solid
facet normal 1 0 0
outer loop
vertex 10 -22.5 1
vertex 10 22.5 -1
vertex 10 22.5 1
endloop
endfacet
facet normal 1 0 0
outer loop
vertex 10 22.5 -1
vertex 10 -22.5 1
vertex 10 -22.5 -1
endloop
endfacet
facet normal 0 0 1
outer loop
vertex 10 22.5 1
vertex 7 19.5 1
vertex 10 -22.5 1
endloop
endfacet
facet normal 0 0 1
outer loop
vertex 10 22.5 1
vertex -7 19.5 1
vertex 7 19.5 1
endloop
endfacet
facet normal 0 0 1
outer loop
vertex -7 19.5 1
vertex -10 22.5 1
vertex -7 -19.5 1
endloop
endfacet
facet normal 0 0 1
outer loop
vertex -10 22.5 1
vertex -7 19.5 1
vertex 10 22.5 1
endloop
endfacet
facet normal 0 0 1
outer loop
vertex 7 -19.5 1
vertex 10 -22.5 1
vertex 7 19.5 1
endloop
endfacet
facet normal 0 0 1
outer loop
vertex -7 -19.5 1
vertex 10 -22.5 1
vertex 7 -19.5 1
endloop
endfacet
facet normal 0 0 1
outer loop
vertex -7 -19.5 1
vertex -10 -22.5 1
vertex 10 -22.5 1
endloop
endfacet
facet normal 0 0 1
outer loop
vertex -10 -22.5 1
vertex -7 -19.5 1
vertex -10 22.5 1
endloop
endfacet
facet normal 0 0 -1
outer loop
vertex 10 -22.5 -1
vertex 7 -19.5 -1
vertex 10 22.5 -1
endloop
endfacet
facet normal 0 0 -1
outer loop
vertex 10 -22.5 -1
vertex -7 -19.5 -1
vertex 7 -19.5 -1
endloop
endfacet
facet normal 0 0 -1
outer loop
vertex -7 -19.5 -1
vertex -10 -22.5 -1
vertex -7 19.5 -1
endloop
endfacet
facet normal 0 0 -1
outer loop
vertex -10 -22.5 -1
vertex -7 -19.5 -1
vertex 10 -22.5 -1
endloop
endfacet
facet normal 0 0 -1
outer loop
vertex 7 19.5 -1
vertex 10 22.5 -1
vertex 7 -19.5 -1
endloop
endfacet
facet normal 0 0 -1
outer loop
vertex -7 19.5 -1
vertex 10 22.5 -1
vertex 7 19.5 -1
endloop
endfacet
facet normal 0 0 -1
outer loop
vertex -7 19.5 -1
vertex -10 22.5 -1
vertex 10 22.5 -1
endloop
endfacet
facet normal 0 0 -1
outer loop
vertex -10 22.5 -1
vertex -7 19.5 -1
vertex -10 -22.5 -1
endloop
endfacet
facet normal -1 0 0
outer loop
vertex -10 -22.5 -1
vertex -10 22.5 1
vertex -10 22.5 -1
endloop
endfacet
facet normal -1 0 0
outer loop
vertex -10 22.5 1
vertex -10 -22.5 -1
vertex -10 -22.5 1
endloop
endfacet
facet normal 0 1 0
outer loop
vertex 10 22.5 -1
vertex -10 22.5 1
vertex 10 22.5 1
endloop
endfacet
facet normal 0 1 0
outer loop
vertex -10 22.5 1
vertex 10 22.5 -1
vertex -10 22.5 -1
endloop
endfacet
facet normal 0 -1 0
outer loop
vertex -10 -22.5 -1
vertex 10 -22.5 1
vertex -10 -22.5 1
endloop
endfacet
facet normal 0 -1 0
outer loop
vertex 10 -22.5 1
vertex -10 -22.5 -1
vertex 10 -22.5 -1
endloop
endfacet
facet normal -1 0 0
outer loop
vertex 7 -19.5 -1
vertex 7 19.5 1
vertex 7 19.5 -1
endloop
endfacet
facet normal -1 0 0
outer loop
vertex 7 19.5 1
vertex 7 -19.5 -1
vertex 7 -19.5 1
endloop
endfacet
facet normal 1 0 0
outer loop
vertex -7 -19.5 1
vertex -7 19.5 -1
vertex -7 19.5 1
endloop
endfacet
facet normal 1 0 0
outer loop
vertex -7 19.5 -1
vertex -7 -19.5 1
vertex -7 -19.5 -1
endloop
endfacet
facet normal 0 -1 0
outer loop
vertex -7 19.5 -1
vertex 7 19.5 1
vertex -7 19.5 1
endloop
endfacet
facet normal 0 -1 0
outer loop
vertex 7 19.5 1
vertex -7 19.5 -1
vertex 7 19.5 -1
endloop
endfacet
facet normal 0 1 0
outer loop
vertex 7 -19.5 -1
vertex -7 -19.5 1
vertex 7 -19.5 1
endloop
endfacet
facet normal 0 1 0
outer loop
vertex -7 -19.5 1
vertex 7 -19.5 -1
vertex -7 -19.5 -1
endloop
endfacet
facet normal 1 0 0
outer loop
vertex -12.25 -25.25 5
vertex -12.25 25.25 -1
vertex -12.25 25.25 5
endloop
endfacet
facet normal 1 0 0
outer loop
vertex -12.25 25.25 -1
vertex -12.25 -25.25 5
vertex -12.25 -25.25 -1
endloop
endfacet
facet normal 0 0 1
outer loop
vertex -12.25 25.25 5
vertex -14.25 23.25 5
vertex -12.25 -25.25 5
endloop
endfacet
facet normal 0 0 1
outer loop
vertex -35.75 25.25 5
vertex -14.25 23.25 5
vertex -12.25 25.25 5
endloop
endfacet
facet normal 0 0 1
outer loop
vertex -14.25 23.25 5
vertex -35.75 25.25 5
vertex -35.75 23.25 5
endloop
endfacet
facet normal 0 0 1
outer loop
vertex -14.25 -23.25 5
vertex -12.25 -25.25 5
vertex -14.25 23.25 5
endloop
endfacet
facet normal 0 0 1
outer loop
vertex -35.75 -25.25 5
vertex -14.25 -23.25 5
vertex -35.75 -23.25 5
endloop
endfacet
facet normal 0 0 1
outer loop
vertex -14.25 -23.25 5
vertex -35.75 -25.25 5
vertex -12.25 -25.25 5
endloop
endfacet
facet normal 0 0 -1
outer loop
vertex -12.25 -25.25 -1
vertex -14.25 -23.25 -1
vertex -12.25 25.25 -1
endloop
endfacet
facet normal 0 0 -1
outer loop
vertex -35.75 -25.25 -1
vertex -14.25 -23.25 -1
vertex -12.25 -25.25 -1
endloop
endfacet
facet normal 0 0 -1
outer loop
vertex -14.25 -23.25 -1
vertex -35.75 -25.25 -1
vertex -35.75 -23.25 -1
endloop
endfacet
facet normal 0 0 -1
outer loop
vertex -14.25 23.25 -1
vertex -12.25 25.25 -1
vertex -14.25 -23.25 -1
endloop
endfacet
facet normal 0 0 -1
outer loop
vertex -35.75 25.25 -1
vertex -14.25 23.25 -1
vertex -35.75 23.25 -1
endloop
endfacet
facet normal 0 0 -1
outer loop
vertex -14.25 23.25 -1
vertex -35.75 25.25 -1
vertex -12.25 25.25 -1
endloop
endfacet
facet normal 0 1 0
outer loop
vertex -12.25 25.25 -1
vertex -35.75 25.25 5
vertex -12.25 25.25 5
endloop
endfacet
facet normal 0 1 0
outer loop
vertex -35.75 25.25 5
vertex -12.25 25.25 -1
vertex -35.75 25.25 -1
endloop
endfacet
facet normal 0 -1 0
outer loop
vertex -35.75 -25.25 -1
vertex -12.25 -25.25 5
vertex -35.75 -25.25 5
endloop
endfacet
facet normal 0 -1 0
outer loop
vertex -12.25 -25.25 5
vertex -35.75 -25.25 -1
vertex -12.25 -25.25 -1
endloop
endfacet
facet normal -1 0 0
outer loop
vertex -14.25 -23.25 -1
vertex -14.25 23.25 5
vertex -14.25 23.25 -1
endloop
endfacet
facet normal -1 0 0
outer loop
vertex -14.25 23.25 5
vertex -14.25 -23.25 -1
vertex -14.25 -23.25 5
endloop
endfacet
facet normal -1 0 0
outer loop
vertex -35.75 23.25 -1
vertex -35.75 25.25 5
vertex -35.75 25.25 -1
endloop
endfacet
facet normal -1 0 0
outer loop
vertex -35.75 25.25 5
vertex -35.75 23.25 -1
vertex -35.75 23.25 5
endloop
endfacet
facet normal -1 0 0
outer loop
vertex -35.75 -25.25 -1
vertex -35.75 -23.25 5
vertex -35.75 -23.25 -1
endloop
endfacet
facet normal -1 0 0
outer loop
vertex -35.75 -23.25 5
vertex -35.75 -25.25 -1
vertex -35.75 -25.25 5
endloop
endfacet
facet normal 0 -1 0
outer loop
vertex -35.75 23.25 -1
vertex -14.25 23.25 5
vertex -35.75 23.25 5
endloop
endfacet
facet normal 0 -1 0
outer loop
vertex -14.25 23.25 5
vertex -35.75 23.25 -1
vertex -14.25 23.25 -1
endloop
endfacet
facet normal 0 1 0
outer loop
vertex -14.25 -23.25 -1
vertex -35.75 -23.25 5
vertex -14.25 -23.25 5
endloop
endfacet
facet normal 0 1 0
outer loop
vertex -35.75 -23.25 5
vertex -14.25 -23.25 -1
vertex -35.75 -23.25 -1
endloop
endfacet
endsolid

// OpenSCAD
w_back = 70;
h_back = 45;
w_controller = 20;
thickness_bottom = 2;
thickness_top = 2;
widht_frame_window = 3;

h_walls = 4;
thickness_walls = 2;
gap_backligh = 1.5;

//kit_controller();
//walls(); 
//debug_controller();
test_print_walls_frame();

module test_print_walls_frame() {
    frame_controller();
    translate([-w_controller-widht_frame_window-2, 0, h_walls/2])
    walls();
}

module frame_controller() {
difference() {
    cube([w_controller, h_back, thickness_top], center=true);
    cube([w_controller-2*widht_frame_window, h_back-2*widht_frame_window, thickness_top+1], center=true);
 }
}

module debug_controller() {
difference() {
    kit_controller();
    translate([-w_controller/2, 0, h_walls/2])
    cube([w_controller, h_back+2*thickness_walls+gap_backligh   +1, 2*h_walls], center=true);
 }
}
module kit_controller() {
    controller();
    translate([0, 0, h_walls/2])
    walls(); 
    color("green")
    translate([0, 0, thickness_bottom+0.1])
    frame_controller();
}

module walls() {
difference() {
    cube([w_controller + 2*thickness_walls+gap_backligh, h_back + 2*thickness_walls+gap_backligh, thickness_bottom + h_walls], center=true);
    color("red")
    cube([w_controller+gap_backligh, h_back+gap_backligh, thickness_bottom + h_walls + 1], center=true);
    translate([-w_controller-thickness_walls+gap_backligh/2-0.25, 0, 0])
    cube([w_controller+gap_backligh, h_back+gap_backligh+2*thickness_walls+1, thickness_bottom+h_walls+1], center=true);
 }
}

module controller(){
cube([w_controller+gap_backligh, h_back+gap_backligh, thickness_bottom], center=true);
}
